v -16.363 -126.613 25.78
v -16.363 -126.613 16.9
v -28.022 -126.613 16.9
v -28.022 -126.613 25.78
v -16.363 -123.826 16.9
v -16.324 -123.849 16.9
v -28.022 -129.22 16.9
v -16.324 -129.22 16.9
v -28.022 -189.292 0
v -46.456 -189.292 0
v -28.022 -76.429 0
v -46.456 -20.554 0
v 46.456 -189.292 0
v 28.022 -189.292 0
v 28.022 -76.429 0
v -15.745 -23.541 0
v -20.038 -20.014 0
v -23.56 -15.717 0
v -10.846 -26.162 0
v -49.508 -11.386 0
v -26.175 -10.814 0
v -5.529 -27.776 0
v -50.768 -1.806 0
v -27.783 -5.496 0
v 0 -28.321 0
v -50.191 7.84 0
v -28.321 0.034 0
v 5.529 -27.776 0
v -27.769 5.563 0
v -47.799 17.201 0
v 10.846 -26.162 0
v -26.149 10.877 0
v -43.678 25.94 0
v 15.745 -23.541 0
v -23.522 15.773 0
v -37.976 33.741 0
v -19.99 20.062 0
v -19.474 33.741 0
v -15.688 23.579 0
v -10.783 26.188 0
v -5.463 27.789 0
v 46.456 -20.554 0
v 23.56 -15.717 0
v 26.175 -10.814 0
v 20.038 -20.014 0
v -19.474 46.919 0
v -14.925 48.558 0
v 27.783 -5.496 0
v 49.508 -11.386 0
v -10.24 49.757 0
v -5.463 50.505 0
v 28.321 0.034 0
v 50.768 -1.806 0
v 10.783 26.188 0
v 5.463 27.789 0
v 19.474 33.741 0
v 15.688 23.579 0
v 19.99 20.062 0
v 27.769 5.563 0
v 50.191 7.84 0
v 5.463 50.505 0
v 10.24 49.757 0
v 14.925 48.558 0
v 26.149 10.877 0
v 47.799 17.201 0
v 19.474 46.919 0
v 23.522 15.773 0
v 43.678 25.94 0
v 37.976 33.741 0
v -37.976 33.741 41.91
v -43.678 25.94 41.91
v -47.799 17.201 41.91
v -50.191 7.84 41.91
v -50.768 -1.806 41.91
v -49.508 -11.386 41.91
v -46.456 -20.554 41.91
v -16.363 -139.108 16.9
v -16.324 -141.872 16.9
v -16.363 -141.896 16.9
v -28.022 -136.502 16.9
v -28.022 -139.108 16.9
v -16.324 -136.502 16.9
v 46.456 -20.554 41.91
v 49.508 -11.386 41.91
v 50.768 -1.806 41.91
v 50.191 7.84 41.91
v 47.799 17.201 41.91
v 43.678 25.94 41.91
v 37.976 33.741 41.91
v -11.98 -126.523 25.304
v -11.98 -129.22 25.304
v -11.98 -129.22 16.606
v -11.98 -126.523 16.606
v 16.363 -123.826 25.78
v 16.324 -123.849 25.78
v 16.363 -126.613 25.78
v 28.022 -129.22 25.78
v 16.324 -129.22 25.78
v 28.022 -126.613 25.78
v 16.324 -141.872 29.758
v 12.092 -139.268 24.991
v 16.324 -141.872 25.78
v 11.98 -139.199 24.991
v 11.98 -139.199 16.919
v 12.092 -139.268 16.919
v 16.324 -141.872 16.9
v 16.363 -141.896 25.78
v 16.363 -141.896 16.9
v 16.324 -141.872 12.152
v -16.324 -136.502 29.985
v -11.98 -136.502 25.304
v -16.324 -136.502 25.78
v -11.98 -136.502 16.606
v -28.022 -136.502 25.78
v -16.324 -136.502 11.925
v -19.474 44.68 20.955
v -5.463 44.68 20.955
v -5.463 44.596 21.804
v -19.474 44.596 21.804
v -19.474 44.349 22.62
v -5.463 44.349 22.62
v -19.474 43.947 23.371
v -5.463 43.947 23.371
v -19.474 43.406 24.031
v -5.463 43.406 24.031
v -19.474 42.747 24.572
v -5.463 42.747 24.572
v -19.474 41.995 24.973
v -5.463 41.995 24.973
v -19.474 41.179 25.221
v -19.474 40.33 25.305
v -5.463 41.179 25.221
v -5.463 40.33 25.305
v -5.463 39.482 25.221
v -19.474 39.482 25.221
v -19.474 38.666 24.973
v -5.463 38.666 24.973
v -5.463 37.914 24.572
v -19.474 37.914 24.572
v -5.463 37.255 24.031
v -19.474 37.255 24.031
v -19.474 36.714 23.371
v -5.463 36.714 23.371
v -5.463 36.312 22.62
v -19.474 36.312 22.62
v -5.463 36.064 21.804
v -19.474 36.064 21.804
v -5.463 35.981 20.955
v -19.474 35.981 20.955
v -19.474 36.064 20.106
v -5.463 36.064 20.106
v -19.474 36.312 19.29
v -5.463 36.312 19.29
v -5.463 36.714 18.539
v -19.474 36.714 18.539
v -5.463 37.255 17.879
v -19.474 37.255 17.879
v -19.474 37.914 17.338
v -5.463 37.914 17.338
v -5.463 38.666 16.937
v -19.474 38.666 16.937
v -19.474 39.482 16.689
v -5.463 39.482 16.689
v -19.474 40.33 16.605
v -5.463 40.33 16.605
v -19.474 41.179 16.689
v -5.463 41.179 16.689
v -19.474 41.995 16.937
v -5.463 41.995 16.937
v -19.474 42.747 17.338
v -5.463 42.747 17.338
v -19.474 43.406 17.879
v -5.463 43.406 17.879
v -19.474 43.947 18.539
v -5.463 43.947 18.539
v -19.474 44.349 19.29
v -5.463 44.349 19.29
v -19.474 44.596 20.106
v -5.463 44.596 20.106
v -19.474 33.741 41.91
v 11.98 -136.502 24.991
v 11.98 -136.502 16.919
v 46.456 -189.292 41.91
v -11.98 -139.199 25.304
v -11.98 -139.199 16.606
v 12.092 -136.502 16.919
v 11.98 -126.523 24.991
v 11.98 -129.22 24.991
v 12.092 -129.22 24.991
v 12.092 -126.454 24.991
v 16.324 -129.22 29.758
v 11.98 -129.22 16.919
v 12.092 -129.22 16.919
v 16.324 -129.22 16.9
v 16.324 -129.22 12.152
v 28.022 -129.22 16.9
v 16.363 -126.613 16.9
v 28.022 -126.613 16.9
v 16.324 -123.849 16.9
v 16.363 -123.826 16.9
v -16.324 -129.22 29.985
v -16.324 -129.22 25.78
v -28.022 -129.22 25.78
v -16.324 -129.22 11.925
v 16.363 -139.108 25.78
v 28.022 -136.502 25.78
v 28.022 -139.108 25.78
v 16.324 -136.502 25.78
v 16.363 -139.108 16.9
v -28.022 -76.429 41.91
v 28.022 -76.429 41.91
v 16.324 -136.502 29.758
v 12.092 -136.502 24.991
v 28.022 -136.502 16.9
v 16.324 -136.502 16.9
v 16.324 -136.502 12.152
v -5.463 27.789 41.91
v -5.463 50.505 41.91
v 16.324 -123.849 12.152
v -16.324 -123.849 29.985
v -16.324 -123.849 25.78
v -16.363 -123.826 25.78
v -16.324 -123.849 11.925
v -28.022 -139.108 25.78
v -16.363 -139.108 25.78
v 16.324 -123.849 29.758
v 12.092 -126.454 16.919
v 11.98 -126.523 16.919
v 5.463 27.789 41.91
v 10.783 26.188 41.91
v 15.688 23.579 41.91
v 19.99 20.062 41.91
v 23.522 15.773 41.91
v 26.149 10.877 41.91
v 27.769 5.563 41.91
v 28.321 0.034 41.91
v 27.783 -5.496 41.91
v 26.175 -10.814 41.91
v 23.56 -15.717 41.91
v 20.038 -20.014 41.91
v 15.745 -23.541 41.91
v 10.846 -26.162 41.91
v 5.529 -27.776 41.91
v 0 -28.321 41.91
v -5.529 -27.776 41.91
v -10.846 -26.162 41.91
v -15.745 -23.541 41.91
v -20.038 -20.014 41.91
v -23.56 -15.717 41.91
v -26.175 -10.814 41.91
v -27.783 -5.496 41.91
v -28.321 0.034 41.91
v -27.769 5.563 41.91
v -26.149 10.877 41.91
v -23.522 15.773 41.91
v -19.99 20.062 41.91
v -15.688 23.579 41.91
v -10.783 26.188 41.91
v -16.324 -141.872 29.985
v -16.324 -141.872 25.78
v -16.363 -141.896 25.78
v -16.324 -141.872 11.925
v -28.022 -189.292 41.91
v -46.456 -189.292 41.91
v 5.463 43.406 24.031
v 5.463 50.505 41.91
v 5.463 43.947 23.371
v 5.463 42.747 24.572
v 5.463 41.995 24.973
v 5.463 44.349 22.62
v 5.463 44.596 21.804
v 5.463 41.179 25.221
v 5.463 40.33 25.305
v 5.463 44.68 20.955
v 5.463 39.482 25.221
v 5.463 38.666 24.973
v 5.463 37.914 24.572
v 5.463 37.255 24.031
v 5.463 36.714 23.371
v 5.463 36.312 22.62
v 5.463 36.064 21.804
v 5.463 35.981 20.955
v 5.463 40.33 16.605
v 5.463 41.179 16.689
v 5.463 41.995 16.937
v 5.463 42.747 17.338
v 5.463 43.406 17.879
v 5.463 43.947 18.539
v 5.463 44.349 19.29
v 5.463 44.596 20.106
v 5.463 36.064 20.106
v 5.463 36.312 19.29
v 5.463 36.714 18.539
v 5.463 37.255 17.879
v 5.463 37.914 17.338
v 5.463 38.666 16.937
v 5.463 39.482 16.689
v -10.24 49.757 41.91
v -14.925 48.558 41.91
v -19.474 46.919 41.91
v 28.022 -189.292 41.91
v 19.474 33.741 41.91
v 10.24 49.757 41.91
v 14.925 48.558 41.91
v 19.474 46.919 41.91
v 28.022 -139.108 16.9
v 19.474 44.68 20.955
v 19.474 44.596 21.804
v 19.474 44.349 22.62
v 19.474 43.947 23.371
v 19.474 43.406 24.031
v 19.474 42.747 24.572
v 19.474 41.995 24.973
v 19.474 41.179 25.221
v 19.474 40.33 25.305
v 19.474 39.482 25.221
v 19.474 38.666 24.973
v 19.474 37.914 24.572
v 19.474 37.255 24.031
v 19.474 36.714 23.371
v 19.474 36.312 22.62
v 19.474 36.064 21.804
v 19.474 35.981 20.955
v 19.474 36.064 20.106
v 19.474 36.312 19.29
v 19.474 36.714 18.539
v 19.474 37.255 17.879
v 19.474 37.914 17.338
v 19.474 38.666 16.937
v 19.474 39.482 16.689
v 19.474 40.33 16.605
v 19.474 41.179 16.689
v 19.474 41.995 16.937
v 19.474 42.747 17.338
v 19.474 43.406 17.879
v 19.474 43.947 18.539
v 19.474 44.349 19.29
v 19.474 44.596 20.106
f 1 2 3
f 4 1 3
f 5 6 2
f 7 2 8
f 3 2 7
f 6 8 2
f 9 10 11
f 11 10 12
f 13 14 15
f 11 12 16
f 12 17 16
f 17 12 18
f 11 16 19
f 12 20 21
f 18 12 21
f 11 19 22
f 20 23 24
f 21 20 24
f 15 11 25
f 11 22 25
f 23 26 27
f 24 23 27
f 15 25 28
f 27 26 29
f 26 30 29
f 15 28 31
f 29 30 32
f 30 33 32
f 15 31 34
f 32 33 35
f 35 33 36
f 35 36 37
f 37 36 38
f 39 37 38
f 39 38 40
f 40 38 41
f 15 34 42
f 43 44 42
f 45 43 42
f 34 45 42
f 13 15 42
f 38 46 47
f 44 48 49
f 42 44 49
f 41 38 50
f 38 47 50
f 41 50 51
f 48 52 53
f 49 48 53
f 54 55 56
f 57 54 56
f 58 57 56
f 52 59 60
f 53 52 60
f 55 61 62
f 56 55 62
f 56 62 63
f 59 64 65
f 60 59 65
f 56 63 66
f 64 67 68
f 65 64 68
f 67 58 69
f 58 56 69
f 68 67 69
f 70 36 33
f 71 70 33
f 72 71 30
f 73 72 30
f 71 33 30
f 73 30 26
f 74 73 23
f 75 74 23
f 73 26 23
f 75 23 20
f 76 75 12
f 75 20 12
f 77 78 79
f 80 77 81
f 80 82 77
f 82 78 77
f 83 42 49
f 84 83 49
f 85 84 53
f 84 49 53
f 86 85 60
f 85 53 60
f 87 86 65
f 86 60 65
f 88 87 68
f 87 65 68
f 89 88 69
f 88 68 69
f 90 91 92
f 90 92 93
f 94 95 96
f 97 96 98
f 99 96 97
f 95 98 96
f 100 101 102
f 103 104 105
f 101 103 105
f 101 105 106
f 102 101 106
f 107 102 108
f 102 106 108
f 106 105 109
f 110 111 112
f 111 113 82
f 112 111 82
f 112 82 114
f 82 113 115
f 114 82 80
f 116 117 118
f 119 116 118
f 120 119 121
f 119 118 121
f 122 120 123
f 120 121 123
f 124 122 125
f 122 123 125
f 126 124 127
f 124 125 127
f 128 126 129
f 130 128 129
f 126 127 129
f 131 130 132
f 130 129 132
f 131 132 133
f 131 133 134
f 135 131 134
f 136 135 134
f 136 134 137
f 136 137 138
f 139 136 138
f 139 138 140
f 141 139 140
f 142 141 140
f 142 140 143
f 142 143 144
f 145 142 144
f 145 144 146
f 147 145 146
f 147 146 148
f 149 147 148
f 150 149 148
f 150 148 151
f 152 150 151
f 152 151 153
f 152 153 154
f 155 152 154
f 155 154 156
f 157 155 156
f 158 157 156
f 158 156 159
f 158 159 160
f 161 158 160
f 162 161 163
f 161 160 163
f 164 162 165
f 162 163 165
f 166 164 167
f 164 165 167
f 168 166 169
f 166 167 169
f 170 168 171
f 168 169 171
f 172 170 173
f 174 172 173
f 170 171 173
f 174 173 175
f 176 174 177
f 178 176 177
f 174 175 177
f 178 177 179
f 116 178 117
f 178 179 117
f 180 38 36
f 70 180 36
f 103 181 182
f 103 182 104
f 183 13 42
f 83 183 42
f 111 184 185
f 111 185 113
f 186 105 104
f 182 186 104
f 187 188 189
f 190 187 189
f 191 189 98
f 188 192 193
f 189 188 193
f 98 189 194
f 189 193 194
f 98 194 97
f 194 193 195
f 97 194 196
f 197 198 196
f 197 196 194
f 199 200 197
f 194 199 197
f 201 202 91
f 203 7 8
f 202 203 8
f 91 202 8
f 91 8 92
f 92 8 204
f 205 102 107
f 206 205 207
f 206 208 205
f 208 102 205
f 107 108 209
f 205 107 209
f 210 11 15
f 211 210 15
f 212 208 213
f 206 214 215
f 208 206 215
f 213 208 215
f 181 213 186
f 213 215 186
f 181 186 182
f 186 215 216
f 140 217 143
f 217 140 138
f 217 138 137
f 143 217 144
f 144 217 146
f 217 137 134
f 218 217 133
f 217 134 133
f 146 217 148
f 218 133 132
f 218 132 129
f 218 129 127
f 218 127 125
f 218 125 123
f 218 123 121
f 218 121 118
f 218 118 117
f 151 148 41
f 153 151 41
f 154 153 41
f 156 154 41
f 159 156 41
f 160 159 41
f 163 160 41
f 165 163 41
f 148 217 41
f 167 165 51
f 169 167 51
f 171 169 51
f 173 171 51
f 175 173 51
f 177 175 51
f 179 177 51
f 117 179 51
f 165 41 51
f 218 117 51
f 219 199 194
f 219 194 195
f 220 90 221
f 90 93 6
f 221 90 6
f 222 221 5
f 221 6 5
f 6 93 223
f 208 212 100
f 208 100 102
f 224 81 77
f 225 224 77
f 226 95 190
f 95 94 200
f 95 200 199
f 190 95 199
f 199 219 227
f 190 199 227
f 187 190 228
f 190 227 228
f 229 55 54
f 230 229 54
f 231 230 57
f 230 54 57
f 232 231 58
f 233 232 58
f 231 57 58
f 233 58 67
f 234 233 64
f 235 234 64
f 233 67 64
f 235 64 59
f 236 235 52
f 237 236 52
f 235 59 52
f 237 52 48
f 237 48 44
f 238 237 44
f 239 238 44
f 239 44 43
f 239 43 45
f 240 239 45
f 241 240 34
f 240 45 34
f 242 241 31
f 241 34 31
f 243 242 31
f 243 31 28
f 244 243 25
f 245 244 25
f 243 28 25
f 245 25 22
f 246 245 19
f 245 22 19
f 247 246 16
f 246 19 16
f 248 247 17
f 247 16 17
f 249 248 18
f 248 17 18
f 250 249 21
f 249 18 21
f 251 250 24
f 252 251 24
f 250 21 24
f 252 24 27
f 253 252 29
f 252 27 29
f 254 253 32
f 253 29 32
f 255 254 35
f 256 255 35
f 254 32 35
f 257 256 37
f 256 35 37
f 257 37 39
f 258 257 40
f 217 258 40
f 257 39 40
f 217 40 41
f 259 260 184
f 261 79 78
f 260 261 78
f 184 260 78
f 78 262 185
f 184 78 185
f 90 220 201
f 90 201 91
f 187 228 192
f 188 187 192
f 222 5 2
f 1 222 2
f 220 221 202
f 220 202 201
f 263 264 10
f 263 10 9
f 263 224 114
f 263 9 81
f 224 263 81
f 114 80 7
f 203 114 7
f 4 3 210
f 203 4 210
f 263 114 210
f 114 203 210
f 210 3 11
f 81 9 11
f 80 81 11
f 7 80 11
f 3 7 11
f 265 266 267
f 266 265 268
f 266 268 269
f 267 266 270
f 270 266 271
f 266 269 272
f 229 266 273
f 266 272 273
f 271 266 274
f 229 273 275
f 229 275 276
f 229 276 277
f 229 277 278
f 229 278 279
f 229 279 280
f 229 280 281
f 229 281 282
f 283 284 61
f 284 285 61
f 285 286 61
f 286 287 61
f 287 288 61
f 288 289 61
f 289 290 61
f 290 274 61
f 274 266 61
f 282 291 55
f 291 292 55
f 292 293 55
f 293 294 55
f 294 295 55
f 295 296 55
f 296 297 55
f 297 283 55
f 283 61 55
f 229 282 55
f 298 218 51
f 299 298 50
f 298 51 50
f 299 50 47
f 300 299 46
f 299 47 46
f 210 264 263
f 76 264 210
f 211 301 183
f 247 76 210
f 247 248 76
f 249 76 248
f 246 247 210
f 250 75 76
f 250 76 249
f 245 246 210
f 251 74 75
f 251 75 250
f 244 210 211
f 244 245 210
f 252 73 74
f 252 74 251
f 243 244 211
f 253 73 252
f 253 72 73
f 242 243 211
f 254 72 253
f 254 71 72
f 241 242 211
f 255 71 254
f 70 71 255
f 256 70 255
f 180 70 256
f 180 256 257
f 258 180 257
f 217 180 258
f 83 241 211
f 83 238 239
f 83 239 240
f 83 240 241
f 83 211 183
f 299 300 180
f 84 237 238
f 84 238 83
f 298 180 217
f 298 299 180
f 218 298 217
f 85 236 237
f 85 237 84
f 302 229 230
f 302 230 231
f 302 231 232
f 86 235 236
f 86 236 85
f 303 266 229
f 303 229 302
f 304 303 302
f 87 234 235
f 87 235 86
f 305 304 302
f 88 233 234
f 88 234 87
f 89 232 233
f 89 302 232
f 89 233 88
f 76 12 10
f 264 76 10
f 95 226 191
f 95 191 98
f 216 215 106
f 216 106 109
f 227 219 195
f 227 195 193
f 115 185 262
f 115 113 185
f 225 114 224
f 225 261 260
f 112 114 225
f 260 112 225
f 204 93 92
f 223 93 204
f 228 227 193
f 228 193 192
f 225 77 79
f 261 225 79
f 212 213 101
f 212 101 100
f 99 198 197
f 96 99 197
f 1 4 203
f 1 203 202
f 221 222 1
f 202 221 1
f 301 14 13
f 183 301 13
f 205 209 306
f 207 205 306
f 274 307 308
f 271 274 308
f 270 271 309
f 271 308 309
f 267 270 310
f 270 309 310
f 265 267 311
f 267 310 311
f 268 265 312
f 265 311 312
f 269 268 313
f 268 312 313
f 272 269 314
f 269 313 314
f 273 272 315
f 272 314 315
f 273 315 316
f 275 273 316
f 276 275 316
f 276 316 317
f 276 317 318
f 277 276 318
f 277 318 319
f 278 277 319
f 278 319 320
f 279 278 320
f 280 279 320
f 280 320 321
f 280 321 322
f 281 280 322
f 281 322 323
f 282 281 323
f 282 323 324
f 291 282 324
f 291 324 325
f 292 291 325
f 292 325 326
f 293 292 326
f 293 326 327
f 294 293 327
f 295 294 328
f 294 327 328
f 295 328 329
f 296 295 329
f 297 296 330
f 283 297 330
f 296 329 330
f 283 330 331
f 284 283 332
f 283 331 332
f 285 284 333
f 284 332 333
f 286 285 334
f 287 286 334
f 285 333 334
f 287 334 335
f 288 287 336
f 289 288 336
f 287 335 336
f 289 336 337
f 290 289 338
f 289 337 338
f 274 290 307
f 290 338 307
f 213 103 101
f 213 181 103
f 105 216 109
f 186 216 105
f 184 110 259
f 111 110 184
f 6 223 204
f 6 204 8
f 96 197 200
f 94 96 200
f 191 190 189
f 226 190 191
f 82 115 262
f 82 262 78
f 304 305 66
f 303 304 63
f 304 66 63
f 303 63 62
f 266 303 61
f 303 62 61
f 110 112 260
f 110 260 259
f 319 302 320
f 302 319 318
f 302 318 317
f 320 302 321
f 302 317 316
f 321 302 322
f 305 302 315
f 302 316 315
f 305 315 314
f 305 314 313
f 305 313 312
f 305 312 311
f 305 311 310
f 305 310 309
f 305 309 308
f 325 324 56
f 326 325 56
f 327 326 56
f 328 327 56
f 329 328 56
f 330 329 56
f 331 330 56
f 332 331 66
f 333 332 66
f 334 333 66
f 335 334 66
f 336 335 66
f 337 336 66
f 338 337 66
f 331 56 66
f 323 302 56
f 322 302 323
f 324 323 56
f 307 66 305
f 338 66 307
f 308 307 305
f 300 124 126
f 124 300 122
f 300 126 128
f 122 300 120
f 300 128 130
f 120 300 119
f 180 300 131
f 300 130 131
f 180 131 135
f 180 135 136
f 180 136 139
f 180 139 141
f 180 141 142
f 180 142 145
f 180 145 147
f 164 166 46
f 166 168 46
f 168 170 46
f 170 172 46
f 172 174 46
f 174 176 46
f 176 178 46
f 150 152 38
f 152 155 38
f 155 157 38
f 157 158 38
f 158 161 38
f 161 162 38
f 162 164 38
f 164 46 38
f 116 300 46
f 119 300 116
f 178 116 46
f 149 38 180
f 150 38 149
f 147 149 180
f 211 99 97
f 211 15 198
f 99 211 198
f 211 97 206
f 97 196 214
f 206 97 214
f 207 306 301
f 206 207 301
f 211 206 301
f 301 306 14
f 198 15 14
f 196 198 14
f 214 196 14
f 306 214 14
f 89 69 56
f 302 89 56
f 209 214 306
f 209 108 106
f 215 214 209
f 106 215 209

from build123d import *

# Parameters (mm, degrees)
F1_DEPTH = 41.91
F3_DEPTH = 132.842
F4_R     = 4.349558
F5_DEPTH = 93


with BuildPart() as f1:
    # F0 (on Top) → F1 (new body)
    with BuildSketch(Plane.XY):
        with BuildLine():
            ThreePointArc((5.462832, 27.789144), (0, -28.321), (-5.462832, 27.789144))
            Line((-5.462832, 27.789144), (-5.462832, 50.50542))
            ThreePointArc((-5.462832, 50.50542), (-12.596589, 49.213473), (-19.473793, 46.919201))
            Line((-19.473793, 46.919201), (-19.473793, 33.741264))
            Line((-19.473793, 33.741264), (-37.975875, 33.741264))
            ThreePointArc((-37.975875, 33.741264), (-50.191445, 7.839567), (-46.456356, -20.553516))
            Line((-46.456356, -20.553516), (-46.456356, -189.292356))
            Line((-46.456356, -189.292356), (-28.022196, -189.292356))
            Line((-28.022196, -189.292356), (-28.022196, -139.108405))
            Line((-28.022196, -139.108405), (-16.363064, -139.108405))
            Line((-16.363064, -139.108405), (-16.363064, -141.895995))
            Line((-16.363064, -141.895995), (-11.980078, -139.198765))
            Line((-11.980078, -139.198765), (-11.980078, -136.501536))
            Line((-11.980078, -136.501536), (-16.363064, -136.501536))
            Line((-16.363064, -136.501536), (-28.022196, -136.501536))
            Line((-28.022196, -136.501536), (-28.022196, -129.22018))
            Line((-28.022196, -129.22018), (-16.363064, -129.22018))
            Line((-16.363064, -129.22018), (-11.980078, -129.22018))
            Line((-11.980078, -129.22018), (-11.980078, -126.522951))
            Line((-11.980078, -126.522951), (-16.363064, -123.825721))
            Line((-16.363064, -123.825721), (-16.363064, -126.613311))
            Line((-16.363064, -126.613311), (-28.022196, -126.613311))
            Line((-28.022196, -126.613311), (-28.022196, -76.42936))
            Line((-28.022196, -76.42936), (0, -76.42936))
            Line((0, -76.42936), (28.022196, -76.42936))
            Line((28.022196, -76.42936), (28.022196, -126.613311))
            Line((28.022196, -126.613311), (16.363064, -126.613311))
            Line((16.363064, -126.613311), (16.363064, -123.825721))
            Line((16.363064, -123.825721), (11.980078, -126.522951))
            Line((11.980078, -126.522951), (11.980078, -129.22018))
            Line((11.980078, -129.22018), (16.363064, -129.22018))
            Line((16.363064, -129.22018), (28.022196, -129.22018))
            Line((28.022196, -129.22018), (28.022196, -136.501536))
            Line((28.022196, -136.501536), (16.363064, -136.501536))
            Line((16.363064, -136.501536), (11.980078, -136.501536))
            Line((11.980078, -136.501536), (11.980078, -139.198765))
            Line((11.980078, -139.198765), (16.363064, -141.895995))
            Line((16.363064, -141.895995), (16.363064, -139.108405))
            Line((16.363064, -139.108405), (28.022196, -139.108405))
            Line((28.022196, -139.108405), (28.022196, -189.292356))
            Line((28.022196, -189.292356), (46.456356, -189.292356))
            Line((46.456356, -189.292356), (46.456356, -20.553516))
            ThreePointArc((46.456356, -20.553516), (50.191445, 7.839567), (37.975875, 33.741264))
            Line((37.975875, 33.741264), (19.473793, 33.741264))
            Line((19.473793, 33.741264), (19.473793, 46.919201))
            ThreePointArc((19.473793, 46.919201), (12.596589, 49.213473), (5.462832, 50.50542))
            Line((5.462832, 50.50542), (5.462832, 27.789144))
        make_face()
    extrude(amount=F1_DEPTH)

    # F2 (on face) → F3 (cut)
    with BuildSketch(Plane.XZ.offset(76.42936)):
        Polygon((-28.022196, 41.91), (-28.022196, 29.9847), (-28.022196, 25.780085), (-16.324459, 25.780085), (-16.324459, 29.9847), (-11.689119, 24.990531), (12.092193, 24.990531), (16.324459, 29.757692), (16.324459, 25.780085), (28.022196, 25.780085), (28.022196, 29.9847), (28.022196, 41.91), align=None)
        Polygon((-16.324459, 16.899664), (-28.022196, 16.899664), (-28.022196, 11.9253), (-28.022196, 0), (0, 0), (28.022196, 0), (28.022196, 11.9253), (28.022196, 16.899664), (16.324459, 16.899664), (16.324459, 12.152308), (12.092193, 16.919469), (-11.689119, 16.919469), (-16.324459, 11.9253), align=None)
    extrude(amount=F3_DEPTH, mode=Mode.SUBTRACT)

    # F4 (on face) → F5 (cut)
    with BuildSketch(Plane.YZ.offset(19.473793)):
        with Locations((40.330232, 20.955)):
            Circle(F4_R)
    extrude(amount=-F5_DEPTH, mode=Mode.SUBTRACT)


solid = f1.part
